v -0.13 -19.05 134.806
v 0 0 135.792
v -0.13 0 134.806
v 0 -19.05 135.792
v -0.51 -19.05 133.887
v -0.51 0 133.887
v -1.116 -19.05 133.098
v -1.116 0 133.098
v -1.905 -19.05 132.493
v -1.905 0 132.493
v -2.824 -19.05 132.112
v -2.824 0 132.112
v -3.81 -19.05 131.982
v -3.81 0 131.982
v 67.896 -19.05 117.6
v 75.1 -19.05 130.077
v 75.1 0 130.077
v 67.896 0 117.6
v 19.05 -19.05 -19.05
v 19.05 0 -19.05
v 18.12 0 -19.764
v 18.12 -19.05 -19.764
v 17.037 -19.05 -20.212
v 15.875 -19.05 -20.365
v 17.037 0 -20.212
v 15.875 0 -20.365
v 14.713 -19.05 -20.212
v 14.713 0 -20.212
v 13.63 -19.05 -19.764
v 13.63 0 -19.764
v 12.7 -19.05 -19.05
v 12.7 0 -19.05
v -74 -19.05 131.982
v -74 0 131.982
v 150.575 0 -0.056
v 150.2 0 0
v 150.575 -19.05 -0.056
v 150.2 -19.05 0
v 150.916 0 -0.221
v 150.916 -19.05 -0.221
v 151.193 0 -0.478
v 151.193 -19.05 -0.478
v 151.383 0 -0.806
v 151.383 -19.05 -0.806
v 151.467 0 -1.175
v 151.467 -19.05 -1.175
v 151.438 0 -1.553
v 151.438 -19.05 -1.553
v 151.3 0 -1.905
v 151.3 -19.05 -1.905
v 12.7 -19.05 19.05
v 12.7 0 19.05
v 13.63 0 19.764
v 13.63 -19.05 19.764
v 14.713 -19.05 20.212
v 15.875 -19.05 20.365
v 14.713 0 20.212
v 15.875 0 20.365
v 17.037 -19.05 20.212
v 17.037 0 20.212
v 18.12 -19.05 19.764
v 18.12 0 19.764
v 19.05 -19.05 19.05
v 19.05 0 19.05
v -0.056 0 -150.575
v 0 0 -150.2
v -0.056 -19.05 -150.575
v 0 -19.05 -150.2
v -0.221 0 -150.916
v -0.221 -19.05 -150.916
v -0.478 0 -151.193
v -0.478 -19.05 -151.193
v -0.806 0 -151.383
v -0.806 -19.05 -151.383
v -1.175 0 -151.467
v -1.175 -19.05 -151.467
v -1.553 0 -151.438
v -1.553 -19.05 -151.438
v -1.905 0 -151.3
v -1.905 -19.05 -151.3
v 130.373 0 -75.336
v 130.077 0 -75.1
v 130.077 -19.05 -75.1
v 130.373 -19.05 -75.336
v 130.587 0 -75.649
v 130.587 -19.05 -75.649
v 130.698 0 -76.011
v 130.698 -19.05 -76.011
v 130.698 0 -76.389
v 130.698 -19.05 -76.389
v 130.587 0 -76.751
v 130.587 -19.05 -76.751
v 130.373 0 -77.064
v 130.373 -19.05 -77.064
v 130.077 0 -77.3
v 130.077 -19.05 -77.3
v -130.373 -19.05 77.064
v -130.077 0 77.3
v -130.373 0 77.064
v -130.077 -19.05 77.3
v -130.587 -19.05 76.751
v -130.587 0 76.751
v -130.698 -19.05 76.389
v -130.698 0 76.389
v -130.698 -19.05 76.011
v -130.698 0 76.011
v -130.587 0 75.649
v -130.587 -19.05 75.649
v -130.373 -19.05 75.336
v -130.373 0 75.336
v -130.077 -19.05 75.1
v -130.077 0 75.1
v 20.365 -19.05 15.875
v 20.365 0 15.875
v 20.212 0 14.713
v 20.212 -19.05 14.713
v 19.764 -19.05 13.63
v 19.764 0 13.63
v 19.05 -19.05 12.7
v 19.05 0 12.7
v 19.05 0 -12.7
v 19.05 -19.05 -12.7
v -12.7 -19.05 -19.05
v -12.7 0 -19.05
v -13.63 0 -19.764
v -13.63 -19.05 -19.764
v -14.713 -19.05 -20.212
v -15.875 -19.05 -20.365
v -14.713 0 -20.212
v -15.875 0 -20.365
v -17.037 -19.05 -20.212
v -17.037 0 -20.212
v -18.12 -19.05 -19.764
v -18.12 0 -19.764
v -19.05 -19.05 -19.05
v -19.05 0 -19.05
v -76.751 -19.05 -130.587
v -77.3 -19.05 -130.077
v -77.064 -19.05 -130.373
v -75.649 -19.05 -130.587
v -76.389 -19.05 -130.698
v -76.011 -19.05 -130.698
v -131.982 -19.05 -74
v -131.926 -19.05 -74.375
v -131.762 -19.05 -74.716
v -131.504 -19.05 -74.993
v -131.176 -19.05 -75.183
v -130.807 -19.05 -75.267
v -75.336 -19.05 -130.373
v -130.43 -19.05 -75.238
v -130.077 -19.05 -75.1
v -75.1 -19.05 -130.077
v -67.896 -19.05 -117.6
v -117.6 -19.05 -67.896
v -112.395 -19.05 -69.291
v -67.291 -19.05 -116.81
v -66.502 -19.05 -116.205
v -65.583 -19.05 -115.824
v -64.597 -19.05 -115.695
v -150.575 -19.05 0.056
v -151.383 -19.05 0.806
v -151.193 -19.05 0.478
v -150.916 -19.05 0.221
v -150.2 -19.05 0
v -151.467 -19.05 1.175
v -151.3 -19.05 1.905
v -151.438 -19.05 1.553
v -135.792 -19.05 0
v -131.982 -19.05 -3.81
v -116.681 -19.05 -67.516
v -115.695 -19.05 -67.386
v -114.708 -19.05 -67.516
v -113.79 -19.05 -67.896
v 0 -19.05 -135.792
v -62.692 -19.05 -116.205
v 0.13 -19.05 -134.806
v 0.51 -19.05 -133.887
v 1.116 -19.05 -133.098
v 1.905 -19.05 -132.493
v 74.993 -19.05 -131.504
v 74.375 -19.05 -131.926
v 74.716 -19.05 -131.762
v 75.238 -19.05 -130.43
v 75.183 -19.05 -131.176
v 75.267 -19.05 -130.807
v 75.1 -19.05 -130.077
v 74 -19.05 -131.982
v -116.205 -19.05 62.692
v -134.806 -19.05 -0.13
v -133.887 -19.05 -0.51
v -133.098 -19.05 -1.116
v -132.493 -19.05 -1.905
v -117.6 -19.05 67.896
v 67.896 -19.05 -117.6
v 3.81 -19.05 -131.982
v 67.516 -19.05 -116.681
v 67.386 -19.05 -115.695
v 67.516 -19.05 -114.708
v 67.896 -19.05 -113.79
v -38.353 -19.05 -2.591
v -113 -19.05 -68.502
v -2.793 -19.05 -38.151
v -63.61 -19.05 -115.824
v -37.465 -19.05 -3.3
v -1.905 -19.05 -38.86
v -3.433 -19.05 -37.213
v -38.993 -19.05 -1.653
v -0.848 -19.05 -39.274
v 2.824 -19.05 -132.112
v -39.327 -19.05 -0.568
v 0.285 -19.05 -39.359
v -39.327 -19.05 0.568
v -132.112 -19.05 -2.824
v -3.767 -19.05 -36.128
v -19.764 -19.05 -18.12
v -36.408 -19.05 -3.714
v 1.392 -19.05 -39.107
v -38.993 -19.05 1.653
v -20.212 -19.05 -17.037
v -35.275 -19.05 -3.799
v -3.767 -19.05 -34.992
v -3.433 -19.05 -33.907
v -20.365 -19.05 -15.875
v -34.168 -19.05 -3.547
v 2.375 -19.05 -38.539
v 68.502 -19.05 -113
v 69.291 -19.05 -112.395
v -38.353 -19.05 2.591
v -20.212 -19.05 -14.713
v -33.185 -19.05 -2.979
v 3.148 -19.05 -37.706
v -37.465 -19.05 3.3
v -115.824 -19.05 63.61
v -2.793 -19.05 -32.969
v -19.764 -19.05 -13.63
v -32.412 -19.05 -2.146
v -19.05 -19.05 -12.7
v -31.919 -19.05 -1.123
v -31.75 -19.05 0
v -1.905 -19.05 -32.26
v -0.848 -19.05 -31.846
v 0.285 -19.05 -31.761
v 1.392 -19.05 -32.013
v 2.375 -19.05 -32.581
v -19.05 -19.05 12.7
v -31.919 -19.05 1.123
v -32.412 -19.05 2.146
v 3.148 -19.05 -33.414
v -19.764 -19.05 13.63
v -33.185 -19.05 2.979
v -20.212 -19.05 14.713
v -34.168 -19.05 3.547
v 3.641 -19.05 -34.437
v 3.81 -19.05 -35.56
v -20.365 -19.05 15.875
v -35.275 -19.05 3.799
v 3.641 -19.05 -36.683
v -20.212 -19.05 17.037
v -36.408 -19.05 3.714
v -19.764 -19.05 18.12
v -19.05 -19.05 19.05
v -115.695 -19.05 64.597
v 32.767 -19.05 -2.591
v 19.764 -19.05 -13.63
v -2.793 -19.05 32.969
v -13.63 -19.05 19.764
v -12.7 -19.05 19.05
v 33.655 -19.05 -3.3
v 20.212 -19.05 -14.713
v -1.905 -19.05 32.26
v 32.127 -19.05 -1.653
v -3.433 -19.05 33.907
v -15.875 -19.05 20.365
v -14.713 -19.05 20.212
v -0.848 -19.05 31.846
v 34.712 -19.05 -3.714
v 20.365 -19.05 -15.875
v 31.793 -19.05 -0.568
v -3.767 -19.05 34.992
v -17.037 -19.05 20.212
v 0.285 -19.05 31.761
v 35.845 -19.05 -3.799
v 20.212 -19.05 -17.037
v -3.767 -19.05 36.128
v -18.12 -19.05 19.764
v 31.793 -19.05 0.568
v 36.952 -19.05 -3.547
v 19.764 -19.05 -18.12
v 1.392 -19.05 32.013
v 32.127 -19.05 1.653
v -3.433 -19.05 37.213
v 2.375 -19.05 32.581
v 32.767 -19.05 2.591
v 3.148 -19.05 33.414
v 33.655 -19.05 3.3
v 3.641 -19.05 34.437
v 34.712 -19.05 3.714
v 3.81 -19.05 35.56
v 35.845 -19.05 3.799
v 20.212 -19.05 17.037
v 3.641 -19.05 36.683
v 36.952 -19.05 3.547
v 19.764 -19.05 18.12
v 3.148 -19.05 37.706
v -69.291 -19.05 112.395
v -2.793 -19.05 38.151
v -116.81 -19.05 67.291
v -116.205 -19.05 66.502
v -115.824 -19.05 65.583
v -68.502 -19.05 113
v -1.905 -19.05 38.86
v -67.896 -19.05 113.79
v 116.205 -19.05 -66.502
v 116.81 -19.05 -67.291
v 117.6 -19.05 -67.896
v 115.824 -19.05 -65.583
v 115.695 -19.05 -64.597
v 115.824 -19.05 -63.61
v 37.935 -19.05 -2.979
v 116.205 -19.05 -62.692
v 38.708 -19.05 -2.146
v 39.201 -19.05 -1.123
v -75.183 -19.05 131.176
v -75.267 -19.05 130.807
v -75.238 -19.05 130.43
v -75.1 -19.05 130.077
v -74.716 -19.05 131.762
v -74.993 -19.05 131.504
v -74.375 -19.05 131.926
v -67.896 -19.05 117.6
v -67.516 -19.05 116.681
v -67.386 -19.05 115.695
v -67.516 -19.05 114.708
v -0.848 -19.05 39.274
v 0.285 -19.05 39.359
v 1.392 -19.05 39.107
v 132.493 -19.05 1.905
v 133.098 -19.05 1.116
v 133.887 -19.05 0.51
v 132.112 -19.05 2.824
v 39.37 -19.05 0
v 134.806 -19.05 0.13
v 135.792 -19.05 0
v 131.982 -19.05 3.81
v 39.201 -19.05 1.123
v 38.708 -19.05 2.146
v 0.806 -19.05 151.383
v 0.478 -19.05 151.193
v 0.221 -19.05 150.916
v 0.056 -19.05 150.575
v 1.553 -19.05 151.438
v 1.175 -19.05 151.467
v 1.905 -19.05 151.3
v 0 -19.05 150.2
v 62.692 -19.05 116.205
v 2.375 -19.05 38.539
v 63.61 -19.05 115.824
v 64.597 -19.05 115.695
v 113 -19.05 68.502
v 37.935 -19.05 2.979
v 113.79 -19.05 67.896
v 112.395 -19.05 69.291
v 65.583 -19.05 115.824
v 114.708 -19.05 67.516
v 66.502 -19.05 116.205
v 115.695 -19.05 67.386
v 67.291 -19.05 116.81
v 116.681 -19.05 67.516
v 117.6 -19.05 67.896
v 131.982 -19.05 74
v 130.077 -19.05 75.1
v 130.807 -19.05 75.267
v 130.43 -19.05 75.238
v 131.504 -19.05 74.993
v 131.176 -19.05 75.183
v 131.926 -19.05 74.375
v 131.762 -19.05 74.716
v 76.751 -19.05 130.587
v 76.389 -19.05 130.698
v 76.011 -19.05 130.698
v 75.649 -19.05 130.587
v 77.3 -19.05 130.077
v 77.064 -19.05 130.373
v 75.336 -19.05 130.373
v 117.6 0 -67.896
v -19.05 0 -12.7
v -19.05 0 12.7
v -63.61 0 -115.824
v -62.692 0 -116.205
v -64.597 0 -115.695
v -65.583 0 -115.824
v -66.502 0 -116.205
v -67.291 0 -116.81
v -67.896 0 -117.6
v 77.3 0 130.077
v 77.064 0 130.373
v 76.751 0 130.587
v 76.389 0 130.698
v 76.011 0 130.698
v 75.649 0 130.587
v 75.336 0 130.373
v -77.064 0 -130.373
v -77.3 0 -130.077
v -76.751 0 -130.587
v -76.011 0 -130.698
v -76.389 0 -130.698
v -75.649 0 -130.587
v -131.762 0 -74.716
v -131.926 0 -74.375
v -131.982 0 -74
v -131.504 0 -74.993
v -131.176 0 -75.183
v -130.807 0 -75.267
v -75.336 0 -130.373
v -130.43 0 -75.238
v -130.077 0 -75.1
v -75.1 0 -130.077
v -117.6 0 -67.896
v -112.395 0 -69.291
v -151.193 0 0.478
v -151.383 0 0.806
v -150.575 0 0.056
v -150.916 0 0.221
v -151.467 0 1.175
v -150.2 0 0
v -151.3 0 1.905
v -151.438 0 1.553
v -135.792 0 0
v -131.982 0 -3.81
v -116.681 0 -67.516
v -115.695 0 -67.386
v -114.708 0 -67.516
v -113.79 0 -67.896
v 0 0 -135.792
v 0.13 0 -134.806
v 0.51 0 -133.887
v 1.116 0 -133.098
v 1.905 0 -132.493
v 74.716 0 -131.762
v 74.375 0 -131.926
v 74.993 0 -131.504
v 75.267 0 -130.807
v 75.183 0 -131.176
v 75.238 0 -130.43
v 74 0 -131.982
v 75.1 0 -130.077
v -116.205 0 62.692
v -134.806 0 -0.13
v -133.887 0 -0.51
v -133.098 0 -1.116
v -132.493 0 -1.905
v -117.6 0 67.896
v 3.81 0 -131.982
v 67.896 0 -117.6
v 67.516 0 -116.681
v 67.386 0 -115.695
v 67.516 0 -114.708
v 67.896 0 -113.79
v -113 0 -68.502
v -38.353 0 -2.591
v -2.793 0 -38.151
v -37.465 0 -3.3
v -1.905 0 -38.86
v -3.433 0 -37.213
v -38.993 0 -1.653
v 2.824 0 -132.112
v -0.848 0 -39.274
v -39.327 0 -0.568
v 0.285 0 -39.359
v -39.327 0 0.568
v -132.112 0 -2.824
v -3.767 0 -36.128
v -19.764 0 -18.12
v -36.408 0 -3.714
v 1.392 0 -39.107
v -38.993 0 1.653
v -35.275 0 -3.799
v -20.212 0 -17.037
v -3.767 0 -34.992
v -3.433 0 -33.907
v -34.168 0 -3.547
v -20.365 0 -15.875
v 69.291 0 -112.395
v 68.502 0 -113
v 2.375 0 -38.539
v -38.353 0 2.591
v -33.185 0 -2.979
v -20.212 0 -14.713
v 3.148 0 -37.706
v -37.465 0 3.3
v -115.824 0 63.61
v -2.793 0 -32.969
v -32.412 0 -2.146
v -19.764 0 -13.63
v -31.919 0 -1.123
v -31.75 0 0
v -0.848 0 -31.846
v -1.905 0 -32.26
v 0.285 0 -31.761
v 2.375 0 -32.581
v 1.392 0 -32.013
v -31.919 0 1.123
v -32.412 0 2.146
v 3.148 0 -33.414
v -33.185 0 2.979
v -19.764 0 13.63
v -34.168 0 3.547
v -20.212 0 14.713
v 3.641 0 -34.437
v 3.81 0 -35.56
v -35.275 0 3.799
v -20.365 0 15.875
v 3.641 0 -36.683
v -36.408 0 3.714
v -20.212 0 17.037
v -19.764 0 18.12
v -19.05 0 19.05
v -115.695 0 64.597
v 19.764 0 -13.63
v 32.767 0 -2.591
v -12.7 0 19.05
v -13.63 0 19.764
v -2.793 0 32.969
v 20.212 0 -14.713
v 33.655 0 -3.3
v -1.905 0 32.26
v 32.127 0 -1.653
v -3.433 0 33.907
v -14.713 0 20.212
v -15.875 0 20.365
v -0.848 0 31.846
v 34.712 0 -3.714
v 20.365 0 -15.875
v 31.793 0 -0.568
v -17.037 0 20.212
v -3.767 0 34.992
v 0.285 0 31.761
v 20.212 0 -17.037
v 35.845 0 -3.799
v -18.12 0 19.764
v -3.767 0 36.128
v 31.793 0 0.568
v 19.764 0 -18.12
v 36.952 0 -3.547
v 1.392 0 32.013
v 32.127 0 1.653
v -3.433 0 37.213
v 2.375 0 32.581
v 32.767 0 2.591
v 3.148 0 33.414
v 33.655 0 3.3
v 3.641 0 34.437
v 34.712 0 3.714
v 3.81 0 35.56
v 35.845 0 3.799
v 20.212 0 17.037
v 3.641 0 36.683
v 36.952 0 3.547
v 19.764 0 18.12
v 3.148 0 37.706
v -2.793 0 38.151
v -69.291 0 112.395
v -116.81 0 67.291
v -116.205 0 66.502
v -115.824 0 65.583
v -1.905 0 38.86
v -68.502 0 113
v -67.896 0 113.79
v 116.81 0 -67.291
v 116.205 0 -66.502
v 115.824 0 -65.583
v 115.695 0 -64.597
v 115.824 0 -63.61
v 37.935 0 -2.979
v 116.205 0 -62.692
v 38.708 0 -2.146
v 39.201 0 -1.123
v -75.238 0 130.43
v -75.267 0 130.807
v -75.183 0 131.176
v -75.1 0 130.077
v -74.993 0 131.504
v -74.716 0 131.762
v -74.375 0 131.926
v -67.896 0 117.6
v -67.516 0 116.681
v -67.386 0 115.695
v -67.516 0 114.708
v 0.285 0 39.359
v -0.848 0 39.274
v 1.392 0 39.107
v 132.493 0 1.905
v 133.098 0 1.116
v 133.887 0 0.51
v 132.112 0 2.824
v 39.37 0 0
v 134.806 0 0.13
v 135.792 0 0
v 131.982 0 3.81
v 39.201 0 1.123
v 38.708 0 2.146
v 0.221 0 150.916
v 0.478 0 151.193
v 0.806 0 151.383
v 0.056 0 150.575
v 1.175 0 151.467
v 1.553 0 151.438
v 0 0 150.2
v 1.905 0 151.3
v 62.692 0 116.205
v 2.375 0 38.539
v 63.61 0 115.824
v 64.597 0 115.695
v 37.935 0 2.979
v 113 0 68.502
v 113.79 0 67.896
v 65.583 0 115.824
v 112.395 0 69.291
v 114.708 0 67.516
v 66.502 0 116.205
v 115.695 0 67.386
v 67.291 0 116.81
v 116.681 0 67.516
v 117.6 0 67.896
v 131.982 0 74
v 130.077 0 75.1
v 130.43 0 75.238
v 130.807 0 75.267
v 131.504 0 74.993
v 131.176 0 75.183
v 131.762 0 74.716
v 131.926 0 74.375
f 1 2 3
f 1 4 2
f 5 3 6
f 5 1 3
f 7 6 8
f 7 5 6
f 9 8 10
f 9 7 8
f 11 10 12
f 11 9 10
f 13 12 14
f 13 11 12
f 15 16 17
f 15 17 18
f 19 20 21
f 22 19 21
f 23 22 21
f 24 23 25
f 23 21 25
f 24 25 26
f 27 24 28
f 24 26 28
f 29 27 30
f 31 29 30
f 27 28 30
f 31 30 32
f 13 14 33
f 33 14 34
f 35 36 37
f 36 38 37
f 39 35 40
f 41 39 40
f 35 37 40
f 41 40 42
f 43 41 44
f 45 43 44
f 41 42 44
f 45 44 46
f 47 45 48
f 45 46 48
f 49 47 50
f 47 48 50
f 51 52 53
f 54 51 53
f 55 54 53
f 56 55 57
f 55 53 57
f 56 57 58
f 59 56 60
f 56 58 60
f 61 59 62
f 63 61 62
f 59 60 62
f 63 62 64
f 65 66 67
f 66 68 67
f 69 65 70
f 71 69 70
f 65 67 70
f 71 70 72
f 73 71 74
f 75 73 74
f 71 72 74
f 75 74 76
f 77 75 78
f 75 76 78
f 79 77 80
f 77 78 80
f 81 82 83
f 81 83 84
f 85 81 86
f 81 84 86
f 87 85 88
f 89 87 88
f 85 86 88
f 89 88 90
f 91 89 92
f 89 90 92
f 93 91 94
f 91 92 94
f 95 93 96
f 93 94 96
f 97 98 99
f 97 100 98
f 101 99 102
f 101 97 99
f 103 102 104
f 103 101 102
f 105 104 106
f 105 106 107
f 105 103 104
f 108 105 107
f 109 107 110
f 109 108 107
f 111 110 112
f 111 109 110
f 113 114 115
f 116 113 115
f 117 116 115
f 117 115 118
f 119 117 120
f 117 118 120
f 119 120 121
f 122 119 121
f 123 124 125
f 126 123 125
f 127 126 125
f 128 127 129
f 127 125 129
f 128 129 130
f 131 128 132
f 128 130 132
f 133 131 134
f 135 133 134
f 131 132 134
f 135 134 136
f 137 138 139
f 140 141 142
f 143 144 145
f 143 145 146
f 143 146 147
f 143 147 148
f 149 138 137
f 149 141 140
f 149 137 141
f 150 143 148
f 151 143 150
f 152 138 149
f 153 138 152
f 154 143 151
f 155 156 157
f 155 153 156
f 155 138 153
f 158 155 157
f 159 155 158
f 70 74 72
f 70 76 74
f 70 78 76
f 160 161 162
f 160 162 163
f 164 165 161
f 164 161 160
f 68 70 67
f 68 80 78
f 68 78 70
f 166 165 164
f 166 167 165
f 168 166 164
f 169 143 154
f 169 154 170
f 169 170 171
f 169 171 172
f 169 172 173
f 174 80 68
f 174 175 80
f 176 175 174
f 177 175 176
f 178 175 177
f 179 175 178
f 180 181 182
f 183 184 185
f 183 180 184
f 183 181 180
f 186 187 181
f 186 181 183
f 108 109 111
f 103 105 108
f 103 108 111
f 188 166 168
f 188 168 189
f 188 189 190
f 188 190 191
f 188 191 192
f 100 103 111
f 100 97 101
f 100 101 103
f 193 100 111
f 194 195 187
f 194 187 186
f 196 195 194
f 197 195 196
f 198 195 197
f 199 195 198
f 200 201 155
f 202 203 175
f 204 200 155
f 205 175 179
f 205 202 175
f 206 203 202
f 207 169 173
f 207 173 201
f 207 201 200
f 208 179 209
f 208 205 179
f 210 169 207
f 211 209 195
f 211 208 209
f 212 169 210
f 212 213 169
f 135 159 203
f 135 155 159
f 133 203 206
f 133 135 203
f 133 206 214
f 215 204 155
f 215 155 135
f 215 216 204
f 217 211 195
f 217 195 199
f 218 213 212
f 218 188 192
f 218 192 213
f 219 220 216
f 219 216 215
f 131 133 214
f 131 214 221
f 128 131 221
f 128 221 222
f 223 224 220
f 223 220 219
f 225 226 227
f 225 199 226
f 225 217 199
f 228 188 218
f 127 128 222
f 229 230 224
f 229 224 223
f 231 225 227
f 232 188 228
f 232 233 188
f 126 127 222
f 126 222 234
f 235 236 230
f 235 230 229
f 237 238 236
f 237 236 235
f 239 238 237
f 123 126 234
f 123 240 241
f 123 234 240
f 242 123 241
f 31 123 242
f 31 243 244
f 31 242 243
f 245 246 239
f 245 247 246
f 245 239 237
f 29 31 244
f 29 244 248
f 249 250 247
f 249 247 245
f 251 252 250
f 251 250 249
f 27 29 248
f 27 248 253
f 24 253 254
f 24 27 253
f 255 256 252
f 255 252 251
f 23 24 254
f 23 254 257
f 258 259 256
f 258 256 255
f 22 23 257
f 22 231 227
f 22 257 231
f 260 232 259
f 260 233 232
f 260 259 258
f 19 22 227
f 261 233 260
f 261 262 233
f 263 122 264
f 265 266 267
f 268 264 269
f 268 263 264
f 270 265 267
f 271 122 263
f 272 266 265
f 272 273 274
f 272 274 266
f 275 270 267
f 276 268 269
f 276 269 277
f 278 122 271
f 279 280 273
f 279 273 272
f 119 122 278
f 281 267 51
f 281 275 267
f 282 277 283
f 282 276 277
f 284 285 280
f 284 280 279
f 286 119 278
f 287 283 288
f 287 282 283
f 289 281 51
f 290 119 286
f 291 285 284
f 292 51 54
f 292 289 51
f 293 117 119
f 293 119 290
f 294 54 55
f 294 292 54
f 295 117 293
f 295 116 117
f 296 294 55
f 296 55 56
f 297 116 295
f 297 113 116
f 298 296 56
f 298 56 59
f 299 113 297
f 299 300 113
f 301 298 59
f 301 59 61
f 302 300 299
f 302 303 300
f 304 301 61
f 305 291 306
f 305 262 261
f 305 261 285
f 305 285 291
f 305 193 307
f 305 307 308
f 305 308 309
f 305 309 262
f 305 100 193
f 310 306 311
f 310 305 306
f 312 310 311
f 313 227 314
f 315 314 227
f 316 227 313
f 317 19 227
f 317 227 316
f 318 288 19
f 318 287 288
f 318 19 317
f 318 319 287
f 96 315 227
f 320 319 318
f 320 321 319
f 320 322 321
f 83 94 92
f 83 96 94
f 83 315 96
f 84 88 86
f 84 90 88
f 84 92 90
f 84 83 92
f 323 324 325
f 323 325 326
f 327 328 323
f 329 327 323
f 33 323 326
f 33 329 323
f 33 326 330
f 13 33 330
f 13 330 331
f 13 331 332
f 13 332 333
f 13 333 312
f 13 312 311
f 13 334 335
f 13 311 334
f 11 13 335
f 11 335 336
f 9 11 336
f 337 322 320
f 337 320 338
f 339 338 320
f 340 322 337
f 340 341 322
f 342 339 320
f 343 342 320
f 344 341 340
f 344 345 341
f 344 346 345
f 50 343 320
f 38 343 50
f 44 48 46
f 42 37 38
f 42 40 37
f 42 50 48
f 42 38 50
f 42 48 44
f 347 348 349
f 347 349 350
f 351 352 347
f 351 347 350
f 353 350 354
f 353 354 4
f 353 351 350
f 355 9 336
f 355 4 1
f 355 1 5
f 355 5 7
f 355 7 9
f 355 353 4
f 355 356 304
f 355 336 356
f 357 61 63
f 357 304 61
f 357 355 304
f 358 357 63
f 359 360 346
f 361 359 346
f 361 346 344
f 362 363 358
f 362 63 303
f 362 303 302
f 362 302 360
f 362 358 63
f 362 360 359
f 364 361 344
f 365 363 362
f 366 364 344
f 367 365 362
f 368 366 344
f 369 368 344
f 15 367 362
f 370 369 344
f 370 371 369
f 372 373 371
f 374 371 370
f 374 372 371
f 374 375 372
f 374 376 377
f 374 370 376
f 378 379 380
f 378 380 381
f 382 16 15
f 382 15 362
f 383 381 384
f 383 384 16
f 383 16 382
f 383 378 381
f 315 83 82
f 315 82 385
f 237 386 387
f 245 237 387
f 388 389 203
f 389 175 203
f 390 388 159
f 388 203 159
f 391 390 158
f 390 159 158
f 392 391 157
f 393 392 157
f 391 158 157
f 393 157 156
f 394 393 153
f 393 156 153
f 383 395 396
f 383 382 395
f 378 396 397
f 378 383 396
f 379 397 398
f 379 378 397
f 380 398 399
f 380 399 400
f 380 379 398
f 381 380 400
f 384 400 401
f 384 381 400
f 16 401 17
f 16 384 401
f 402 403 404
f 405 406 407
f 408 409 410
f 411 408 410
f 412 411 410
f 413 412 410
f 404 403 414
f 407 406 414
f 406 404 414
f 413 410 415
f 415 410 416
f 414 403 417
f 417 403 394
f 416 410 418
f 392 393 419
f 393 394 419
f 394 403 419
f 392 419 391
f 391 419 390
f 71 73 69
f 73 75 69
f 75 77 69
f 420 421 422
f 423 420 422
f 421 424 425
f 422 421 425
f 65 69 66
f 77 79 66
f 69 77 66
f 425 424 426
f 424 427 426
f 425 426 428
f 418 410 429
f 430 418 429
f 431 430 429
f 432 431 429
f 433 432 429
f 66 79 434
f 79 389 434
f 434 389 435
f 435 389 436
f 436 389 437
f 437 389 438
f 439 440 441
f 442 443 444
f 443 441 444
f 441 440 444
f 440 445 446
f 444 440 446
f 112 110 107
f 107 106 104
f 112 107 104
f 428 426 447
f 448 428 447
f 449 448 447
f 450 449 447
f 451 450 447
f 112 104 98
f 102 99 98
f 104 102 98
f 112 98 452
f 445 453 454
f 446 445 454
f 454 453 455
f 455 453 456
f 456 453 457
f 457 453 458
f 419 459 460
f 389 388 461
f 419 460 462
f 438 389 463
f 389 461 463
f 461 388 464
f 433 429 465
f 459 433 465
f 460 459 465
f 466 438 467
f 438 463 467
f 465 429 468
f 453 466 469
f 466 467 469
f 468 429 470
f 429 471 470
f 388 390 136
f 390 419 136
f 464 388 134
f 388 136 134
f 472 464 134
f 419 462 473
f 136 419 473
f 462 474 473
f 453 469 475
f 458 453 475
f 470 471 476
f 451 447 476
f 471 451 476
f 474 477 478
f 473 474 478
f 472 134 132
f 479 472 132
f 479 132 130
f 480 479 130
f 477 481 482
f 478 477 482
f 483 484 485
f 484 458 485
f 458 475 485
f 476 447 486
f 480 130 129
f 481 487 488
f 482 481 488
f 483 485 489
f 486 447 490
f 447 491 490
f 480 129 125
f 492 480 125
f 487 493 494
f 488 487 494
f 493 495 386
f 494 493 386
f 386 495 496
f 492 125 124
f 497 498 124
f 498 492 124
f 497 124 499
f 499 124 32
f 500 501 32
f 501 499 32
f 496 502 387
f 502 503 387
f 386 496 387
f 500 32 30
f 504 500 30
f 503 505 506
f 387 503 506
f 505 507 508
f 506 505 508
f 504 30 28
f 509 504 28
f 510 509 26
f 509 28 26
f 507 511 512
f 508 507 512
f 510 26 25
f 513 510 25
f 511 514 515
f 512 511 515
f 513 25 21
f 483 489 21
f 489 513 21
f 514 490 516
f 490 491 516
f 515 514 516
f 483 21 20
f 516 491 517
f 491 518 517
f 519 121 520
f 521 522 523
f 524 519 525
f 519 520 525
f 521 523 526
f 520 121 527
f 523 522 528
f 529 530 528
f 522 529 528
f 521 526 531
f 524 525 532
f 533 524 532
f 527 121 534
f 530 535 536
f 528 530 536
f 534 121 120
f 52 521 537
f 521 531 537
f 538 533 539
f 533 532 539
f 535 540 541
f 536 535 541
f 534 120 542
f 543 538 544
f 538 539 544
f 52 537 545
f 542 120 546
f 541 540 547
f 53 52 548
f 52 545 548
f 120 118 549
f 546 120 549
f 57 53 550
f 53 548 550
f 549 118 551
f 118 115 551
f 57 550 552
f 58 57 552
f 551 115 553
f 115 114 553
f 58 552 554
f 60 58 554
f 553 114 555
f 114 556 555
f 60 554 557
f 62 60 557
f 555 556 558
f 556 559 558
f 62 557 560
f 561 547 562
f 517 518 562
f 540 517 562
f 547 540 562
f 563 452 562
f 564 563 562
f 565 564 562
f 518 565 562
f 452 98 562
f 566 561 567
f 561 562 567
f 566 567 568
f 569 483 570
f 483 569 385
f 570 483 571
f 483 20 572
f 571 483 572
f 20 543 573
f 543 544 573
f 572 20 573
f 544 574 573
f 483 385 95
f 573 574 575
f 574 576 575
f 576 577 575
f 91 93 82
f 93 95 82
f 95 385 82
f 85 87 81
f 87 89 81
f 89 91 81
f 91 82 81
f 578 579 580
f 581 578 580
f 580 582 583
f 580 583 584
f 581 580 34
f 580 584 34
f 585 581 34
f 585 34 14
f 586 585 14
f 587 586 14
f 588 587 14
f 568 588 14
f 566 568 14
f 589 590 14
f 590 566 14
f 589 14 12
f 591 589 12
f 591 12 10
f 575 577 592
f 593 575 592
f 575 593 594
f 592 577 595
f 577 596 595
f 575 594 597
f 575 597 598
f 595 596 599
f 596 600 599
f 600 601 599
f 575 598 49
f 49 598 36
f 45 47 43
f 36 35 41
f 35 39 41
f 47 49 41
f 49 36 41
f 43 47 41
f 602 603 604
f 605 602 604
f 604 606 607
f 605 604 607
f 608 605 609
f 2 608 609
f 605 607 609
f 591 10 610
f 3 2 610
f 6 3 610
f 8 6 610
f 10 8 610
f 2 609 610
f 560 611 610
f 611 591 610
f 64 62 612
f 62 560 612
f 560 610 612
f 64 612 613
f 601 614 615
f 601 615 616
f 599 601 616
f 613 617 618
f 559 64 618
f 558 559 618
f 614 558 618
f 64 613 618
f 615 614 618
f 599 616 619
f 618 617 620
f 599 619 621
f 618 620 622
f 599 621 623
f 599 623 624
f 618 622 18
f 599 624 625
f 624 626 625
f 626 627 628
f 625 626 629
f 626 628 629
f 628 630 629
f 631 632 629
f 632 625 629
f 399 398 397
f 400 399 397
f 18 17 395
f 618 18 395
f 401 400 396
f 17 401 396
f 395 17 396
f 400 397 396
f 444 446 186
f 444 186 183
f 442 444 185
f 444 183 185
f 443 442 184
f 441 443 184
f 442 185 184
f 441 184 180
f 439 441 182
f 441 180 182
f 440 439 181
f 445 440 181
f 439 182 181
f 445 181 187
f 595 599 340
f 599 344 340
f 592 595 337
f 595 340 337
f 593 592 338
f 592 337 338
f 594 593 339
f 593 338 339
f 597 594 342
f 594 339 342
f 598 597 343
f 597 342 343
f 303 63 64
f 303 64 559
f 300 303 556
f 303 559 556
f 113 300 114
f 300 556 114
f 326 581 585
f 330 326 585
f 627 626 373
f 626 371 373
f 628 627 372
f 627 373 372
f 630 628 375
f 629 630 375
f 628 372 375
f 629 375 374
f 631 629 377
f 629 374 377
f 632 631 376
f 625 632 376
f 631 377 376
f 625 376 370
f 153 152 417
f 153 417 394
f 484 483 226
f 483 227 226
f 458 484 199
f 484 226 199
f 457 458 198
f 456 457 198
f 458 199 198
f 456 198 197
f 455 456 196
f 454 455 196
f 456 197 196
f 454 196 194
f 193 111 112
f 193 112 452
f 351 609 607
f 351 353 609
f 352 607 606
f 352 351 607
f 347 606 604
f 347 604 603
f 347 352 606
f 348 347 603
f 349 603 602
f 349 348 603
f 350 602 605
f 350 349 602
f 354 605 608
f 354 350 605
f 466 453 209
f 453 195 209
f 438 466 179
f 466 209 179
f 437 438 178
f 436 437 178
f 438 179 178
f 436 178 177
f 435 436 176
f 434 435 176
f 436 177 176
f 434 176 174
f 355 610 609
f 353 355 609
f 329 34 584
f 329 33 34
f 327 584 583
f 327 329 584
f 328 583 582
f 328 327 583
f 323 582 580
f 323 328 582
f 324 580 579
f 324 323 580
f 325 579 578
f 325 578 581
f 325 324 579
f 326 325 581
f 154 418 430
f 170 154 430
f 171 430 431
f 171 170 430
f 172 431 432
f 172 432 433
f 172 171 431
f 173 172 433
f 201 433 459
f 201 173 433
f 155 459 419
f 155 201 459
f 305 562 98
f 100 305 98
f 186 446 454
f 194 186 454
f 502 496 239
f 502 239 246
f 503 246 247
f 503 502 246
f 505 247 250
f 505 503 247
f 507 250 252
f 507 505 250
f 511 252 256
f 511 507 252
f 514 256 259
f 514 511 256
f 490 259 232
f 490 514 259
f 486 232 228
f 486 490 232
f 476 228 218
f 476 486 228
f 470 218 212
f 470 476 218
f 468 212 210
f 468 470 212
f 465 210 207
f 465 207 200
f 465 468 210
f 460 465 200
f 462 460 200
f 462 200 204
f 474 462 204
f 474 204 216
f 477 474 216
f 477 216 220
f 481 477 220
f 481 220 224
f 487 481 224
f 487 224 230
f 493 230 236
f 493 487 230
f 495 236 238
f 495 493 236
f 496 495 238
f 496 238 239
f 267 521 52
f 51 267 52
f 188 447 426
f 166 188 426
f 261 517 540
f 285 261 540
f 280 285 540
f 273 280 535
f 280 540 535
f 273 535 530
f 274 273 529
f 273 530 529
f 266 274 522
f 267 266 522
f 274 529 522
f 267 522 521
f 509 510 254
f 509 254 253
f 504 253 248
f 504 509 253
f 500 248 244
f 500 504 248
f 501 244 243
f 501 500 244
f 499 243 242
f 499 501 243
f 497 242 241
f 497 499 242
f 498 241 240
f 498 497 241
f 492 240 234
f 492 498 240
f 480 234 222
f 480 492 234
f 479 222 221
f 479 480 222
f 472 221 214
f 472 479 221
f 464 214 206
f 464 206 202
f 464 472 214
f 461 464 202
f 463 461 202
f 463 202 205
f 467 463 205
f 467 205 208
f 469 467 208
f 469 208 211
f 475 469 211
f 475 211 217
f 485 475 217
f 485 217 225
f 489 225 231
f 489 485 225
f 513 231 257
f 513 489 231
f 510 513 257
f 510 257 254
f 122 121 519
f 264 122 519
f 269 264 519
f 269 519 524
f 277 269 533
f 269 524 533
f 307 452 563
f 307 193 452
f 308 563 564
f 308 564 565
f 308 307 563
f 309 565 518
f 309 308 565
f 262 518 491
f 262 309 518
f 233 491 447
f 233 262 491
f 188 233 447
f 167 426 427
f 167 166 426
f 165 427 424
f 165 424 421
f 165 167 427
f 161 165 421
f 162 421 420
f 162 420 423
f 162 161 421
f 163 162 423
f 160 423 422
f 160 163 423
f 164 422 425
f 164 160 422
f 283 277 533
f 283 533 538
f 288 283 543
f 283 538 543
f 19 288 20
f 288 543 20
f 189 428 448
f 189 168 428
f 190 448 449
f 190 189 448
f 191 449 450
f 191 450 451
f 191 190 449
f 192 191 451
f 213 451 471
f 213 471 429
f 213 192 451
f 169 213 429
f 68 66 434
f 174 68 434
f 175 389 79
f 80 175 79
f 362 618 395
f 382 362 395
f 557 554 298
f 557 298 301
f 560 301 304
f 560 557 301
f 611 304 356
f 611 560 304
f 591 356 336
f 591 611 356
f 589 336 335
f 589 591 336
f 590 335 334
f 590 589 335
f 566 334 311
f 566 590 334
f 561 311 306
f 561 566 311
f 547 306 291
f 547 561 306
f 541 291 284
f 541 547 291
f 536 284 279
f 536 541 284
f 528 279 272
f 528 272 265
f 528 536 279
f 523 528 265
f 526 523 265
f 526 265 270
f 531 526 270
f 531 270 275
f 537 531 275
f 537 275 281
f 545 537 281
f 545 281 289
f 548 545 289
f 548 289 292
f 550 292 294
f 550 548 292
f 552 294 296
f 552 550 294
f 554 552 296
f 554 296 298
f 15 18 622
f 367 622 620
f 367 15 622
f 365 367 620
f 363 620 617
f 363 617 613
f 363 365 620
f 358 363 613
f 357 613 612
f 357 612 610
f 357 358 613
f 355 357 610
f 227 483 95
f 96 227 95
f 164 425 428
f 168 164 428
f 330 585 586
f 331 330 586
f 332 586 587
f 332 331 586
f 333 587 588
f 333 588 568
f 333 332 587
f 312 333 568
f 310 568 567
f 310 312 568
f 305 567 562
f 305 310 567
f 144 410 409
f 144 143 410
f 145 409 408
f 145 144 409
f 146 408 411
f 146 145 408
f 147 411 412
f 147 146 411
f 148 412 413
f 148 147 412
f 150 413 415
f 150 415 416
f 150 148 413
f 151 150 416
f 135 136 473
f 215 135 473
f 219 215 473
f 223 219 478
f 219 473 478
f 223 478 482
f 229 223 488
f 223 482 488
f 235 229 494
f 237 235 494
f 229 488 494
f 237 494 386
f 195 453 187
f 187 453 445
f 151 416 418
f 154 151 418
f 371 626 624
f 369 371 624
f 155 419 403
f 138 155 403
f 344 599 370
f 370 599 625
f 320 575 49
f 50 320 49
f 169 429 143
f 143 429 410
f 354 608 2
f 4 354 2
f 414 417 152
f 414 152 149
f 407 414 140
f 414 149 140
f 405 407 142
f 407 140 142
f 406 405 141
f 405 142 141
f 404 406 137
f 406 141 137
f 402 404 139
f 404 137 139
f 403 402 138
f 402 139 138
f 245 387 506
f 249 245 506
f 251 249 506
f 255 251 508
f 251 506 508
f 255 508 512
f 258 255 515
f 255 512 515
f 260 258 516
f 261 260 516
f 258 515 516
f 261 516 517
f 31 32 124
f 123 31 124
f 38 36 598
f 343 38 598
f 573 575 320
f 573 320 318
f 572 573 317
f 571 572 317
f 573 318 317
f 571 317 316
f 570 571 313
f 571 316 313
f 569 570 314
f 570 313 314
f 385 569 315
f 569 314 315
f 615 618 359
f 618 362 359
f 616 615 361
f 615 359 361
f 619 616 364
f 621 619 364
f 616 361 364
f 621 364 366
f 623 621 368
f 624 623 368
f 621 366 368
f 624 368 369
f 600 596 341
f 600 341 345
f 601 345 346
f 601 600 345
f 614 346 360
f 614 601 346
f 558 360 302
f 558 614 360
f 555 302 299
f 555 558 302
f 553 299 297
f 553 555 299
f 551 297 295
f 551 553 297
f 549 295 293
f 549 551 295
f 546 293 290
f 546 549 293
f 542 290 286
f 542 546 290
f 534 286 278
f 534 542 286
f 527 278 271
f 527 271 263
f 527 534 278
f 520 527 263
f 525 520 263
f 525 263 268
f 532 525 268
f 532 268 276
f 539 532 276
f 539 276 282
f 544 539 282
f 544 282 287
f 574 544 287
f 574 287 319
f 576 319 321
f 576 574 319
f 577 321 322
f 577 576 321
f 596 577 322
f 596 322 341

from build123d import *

# Parameters (mm, degrees)
F0_R     = 3.81
F1_DEPTH = 19.05
F2_R     = 3.81
F3_R     = 1.27


with BuildPart() as f1:
    # F0 (on Front) → F1 (new body)
    with BuildSketch(Plane.XZ):
        Polygon((114.3, 65.991136), (76.2, 131.982272), (65.991136, 114.3), (0, 152.4), (0, 131.982272), (-76.2, 131.982272), (-65.991136, 114.3), (-131.982272, 76.2), (-114.3, 65.991136), (-152.4, 0), (-131.982272, 0), (-131.982272, -76.2), (-114.3, -65.991136), (-76.2, -131.982272), (-65.991136, -114.3), (0, -152.4), (0, -131.982272), (76.2, -131.982272), (65.991136, -114.3), (131.982272, -76.2), (114.3, -65.991136), (152.4, 0), (131.982272, 0), (131.982272, 76.2), align=None)
        with Locations((0, -35.56)):
            Circle(F0_R, mode=Mode.SUBTRACT)
        with Locations((-35.56, 0)):
            Circle(F0_R, mode=Mode.SUBTRACT)
        with BuildLine():
            ThreePointArc((-12.7, -19.05), (-15.875, -20.365128), (-19.05, -19.05))
            ThreePointArc((-19.05, -19.05), (-20.365128, -15.875), (-19.05, -12.7))
            Line((-19.05, -12.7), (-19.05, 12.7))
            ThreePointArc((-19.05, 12.7), (-20.365128, 15.875), (-19.05, 19.05))
            ThreePointArc((-19.05, 19.05), (-15.875, 20.365128), (-12.7, 19.05))
            Line((-12.7, 19.05), (12.7, 19.05))
            ThreePointArc((12.7, 19.05), (15.875, 20.365128), (19.05, 19.05))
            ThreePointArc((19.05, 19.05), (20.023337, 17.593298), (20.365128, 15.875))
            ThreePointArc((20.365128, 15.875), (20.023337, 14.156702), (19.05, 12.7))
            Line((19.05, 12.7), (19.05, -12.7))
            ThreePointArc((19.05, -12.7), (20.023337, -14.156702), (20.365128, -15.875))
            ThreePointArc((20.365128, -15.875), (20.023337, -17.593298), (19.05, -19.05))
            ThreePointArc((19.05, -19.05), (15.875, -20.365128), (12.7, -19.05))
            Line((12.7, -19.05), (-12.7, -19.05))
        make_face(mode=Mode.SUBTRACT)
        with Locations((35.56, 0)):
            Circle(F0_R, mode=Mode.SUBTRACT)
        with Locations((0, 35.56)):
            Circle(F0_R, mode=Mode.SUBTRACT)
    extrude(amount=F1_DEPTH)

    # F2
    f2_edges = [f1.edges().sort_by_distance(p)[0] for p in [
        (65.991136, -9.525, 114.3),
        (114.3, -9.525, 65.991136),
        (131.982272, -9.525, 0),
        (114.3, -9.525, -65.991136),
        (65.991136, -9.525, -114.3),
        (0, -9.525, -131.982272),
        (-65.991136, -9.525, -114.3),
        (-114.3, -9.525, -65.991136),
        (-131.982272, -9.525, 0),
        (-114.3, -9.525, 65.991136),
        (-65.991136, -9.525, 114.3),
        (0, -9.525, 131.982272),
    ]]
    fillet(f2_edges, radius=F2_R)

    # F3
    f3_edges = [f1.edges().sort_by_distance(p)[0] for p in [
        (0, -9.525, 152.4),
        (76.2, -9.525, 131.982272),
        (131.982272, -9.525, 76.2),
        (152.4, -9.525, 0),
        (131.982272, -9.525, -76.2),
        (76.2, -9.525, -131.982272),
        (0, -9.525, -152.4),
        (-76.2, -9.525, -131.982272),
        (-131.982272, -9.525, -76.2),
        (-152.4, -9.525, 0),
        (-131.982272, -9.525, 76.2),
        (-76.2, -9.525, 131.982272),
    ]]
    fillet(f3_edges, radius=F3_R)


solid = f1.part
